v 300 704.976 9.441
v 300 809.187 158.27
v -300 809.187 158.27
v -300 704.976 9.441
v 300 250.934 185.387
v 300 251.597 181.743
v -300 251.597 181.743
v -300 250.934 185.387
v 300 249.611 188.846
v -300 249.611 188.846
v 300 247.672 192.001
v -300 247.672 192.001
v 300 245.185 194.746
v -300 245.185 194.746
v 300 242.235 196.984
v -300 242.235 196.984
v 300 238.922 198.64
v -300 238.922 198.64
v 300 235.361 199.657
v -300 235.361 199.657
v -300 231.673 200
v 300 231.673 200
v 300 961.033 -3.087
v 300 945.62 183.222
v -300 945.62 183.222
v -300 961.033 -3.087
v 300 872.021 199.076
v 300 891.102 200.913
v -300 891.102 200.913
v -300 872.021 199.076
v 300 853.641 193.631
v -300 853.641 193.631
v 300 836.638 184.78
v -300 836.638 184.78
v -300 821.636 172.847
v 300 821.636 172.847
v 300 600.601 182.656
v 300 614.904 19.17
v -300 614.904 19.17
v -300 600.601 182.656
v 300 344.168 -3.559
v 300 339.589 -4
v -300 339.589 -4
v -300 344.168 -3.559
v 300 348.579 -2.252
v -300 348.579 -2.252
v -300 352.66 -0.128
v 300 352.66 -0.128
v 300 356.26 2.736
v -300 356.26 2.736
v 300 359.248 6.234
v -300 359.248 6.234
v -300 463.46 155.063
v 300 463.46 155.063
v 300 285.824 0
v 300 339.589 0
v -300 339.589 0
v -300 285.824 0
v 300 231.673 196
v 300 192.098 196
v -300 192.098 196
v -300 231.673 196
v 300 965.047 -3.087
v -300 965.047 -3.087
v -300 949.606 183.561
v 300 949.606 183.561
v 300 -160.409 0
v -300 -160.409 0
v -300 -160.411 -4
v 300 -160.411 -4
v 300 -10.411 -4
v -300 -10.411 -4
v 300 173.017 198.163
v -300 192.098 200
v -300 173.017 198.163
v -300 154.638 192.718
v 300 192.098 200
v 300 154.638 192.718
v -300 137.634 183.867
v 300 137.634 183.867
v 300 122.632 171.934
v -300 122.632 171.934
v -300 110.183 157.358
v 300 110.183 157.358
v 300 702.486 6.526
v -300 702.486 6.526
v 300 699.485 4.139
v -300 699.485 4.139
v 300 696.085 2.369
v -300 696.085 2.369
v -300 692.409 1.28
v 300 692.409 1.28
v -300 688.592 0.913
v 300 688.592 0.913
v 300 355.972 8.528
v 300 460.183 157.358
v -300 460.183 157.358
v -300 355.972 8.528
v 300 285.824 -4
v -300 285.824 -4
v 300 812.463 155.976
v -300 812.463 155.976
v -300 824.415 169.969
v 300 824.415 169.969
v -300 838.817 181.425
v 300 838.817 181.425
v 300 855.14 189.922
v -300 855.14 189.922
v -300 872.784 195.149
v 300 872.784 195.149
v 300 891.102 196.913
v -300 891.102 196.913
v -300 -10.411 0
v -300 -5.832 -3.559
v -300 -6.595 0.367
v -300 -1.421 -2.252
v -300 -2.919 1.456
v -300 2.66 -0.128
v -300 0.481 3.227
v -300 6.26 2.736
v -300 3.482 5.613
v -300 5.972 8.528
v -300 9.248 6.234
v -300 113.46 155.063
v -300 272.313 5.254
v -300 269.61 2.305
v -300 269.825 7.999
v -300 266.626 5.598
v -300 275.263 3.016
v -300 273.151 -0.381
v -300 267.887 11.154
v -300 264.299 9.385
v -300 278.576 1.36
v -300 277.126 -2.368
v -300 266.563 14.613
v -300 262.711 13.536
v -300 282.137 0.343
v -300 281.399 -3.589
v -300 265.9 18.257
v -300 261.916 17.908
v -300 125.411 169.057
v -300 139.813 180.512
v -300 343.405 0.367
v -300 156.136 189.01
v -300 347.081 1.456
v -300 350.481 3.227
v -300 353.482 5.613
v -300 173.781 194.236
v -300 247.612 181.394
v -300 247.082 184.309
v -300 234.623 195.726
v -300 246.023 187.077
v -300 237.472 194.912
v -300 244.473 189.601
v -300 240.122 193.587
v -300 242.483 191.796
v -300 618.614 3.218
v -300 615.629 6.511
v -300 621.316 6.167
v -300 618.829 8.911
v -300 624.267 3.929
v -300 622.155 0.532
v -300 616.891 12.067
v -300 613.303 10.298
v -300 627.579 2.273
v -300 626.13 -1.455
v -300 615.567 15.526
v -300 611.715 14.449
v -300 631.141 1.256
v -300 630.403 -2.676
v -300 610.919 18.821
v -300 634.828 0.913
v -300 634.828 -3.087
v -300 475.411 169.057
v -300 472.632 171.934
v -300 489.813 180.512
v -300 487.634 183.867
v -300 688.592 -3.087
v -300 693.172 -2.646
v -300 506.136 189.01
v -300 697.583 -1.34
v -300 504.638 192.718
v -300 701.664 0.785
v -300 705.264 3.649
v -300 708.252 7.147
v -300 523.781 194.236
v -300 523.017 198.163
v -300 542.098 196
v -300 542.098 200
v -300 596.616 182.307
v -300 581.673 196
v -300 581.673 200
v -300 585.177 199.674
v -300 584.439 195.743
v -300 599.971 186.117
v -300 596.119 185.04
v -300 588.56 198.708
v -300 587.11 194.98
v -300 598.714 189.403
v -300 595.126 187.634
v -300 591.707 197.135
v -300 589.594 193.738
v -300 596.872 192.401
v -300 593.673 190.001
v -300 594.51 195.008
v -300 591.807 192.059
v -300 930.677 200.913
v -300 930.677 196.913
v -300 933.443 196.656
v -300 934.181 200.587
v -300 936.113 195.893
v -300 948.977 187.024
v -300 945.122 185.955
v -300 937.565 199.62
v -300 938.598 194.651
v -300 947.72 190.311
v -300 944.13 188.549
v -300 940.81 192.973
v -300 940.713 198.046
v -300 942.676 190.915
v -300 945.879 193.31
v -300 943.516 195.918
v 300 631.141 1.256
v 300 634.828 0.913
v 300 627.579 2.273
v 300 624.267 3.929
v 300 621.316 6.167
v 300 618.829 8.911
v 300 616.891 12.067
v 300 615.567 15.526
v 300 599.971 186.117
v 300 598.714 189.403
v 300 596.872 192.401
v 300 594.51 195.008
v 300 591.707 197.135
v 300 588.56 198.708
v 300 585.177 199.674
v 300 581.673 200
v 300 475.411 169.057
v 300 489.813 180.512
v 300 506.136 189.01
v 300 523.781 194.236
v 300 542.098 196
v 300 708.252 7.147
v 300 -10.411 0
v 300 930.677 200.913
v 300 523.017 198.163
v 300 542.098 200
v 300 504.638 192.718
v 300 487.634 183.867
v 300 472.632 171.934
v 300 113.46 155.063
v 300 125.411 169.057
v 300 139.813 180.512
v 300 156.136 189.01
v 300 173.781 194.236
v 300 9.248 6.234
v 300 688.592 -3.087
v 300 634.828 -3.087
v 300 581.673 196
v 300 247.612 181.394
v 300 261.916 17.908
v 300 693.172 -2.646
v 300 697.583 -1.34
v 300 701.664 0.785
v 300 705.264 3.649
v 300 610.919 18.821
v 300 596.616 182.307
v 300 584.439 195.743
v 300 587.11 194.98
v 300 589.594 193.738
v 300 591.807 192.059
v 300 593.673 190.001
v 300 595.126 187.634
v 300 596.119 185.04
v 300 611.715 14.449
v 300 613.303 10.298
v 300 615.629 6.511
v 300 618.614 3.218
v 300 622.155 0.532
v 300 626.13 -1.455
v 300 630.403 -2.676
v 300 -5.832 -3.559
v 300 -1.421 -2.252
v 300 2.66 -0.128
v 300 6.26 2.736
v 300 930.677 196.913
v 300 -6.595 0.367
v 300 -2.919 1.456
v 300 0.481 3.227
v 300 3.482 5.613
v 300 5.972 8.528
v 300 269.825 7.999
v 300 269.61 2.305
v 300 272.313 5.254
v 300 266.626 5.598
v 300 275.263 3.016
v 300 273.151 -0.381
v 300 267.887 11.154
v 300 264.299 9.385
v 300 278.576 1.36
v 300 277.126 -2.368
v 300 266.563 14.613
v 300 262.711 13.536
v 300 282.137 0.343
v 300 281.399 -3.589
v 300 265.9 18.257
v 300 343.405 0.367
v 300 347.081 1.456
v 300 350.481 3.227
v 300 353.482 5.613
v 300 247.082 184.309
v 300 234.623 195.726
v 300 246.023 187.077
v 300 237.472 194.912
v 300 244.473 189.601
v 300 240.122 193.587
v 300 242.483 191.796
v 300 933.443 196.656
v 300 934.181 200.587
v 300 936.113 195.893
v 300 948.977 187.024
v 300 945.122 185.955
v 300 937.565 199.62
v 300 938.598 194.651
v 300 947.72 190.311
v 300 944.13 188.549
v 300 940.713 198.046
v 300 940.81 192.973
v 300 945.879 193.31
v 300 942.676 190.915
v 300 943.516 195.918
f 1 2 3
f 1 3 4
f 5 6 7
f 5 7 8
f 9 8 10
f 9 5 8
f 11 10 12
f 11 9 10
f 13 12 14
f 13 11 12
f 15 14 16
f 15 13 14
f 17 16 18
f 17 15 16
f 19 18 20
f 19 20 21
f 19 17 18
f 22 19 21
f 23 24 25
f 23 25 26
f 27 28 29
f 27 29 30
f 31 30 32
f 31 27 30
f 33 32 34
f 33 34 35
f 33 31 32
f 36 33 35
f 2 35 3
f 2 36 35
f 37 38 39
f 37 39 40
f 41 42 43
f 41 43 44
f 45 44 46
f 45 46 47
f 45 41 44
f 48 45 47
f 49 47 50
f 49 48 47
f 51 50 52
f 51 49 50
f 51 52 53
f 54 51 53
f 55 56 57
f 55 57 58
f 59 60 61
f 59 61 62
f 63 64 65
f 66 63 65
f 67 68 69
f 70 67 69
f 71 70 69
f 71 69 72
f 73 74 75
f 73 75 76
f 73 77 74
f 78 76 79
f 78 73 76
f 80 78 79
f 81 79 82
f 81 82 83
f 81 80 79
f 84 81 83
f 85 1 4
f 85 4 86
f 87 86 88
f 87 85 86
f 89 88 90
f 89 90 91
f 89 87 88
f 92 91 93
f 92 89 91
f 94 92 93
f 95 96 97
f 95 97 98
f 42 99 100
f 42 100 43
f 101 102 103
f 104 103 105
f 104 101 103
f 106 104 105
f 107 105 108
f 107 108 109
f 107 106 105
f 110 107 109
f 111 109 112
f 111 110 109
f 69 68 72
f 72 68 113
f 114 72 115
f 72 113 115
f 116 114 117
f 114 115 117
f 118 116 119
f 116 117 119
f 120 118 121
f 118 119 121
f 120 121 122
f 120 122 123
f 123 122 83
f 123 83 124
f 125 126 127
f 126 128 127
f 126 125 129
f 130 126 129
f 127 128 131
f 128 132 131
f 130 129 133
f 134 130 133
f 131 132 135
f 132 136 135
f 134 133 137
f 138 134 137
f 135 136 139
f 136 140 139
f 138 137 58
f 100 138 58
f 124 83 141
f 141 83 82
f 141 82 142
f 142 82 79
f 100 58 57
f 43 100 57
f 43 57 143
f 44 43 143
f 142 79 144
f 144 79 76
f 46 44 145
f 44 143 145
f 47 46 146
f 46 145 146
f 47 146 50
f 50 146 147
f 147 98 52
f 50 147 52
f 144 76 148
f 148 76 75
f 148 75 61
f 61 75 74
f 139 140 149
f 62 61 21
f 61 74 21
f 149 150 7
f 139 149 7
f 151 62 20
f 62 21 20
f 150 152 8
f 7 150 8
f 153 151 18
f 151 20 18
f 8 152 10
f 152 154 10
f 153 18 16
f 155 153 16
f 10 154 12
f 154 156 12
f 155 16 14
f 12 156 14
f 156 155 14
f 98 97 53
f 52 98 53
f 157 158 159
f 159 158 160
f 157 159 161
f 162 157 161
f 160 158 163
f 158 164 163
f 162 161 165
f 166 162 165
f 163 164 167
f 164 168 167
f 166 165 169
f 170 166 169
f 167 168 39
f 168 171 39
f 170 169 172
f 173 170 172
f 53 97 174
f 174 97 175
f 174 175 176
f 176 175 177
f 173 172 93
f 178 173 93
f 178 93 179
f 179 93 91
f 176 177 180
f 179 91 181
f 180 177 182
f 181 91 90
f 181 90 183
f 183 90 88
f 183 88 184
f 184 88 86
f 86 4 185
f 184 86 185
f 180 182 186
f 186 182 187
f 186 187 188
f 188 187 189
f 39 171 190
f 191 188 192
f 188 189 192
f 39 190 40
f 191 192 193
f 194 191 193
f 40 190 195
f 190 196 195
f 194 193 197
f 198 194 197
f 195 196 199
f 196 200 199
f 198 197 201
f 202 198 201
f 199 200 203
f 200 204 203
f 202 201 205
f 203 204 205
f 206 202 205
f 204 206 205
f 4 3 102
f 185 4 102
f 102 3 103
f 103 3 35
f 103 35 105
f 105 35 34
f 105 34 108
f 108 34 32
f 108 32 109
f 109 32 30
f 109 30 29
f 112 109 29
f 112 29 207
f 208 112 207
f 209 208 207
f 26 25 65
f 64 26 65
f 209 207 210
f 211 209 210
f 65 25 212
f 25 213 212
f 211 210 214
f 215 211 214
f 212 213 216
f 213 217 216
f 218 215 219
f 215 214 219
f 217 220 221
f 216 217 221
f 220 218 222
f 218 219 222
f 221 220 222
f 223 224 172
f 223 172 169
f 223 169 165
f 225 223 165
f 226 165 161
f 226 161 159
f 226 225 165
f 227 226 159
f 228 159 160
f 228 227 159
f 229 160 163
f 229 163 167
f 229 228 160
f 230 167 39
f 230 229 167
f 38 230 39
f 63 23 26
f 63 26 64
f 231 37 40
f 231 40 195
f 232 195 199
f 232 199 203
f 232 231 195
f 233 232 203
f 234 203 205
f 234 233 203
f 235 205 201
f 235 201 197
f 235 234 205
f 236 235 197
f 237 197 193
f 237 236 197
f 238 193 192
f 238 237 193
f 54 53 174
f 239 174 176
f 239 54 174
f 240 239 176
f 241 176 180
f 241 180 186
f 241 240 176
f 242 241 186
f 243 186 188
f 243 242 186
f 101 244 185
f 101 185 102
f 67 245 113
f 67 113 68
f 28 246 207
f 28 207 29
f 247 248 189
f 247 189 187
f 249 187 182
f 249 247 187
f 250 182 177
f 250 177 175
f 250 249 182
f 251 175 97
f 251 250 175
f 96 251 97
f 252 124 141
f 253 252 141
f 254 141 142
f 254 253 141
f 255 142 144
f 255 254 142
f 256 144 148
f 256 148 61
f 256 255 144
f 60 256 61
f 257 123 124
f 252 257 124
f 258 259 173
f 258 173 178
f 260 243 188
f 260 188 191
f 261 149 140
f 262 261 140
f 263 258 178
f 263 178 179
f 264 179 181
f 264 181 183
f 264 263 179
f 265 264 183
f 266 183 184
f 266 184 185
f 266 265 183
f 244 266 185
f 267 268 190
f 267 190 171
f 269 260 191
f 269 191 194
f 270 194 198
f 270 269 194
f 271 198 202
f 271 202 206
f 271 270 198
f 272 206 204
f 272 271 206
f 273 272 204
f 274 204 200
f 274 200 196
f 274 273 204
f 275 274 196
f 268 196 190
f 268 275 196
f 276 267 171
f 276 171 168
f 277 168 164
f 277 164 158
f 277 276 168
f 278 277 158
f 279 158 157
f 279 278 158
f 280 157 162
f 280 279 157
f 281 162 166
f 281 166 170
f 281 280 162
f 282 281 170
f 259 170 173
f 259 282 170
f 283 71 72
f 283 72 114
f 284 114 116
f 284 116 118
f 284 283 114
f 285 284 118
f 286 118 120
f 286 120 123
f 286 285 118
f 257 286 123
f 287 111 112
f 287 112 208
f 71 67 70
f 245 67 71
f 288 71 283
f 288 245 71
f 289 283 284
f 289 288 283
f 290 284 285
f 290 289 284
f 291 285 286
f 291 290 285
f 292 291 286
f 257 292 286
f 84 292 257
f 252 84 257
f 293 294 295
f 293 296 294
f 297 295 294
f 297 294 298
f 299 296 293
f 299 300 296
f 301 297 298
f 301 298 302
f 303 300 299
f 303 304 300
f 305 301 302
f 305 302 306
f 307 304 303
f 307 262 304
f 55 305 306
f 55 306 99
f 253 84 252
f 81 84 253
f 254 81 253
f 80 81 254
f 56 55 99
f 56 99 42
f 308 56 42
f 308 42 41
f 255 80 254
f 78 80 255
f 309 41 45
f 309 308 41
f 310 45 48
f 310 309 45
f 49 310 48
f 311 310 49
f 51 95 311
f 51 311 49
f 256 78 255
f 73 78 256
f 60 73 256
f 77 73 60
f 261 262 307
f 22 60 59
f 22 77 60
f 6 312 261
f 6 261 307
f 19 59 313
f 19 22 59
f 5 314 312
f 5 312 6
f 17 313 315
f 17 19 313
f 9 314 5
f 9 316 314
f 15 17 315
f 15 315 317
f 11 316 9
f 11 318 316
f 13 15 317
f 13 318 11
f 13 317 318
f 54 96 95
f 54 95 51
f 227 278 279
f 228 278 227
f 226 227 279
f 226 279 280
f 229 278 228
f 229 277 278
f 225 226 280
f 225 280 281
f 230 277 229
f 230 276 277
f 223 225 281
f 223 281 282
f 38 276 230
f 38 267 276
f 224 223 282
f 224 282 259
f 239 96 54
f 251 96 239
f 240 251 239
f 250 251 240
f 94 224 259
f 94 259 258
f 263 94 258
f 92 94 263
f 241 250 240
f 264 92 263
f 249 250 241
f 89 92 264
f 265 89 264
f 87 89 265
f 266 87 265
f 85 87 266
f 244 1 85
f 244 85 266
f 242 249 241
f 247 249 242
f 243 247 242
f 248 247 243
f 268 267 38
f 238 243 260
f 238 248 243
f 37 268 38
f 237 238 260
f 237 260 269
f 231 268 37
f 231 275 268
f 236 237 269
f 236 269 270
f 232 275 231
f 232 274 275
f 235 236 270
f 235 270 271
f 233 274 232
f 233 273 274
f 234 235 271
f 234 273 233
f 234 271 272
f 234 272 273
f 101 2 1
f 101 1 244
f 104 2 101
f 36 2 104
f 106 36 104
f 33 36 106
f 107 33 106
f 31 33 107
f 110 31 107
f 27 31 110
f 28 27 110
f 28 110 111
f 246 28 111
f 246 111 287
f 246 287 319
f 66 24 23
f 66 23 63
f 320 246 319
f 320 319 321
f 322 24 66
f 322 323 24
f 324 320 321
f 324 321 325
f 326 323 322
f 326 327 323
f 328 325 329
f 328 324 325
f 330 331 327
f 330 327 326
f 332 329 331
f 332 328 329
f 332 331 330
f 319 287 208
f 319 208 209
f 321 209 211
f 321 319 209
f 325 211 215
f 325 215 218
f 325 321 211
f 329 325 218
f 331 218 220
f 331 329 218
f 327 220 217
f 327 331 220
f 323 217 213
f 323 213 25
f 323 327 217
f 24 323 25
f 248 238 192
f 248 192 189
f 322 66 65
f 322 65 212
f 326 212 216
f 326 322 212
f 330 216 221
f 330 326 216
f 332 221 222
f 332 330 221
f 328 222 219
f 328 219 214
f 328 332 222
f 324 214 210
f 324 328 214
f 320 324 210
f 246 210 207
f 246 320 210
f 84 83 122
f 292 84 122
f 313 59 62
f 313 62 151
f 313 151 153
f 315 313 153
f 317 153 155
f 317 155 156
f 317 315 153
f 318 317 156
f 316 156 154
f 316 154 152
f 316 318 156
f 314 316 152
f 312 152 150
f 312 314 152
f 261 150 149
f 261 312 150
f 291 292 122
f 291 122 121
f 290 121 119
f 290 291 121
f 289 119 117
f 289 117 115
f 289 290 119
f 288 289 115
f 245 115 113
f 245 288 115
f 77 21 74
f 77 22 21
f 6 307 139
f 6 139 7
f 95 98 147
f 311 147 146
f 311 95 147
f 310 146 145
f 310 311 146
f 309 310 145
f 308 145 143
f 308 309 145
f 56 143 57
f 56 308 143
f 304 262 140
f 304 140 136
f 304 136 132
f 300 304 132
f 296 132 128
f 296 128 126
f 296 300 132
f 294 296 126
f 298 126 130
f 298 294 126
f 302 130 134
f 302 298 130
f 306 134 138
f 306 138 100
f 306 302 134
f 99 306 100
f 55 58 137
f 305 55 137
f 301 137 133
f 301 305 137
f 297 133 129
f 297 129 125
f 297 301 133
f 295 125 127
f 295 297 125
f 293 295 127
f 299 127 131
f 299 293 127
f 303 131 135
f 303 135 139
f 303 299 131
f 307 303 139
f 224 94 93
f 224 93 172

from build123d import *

# Parameters (mm, degrees)
F1_DEPTH      = 300
F1_DEPTH_BACK = 300


with BuildPart() as f1:
    # F0 (on Right) → F1 (new body, two sides)
    with BuildSketch(Plane.YZ) as f1_sk:
        with BuildLine():
            Line((110.183008, 157.357644), (5.9717, 8.528471))
            ThreePointArc((5.9717, 8.528471), (-1.176369, 2.259783), (-10.411341, 0))
            Line((-10.411341, 0), (-160.408616, 0))
            Line((-160.408616, 0), (-160.411341, -4))
            Line((-160.411341, -4), (-10.411341, -4))
            ThreePointArc((-10.411341, -4), (0.670626, -1.28826), (9.248308, 6.234166))
            Line((9.248308, 6.234166), (113.459616, 155.063338))
            ThreePointArc((113.459616, 155.063338), (147.770346, 185.15304), (192.098213, 196))
            Line((192.098213, 196), (231.673377, 196))
            ThreePointArc((231.673377, 196), (242.48282, 191.796437), (247.612492, 181.394492))
            Line((247.612492, 181.394492), (261.915687, 17.908216))
            ThreePointArc((261.915687, 17.908216), (269.610202, 2.305292), (285.824377, -4.000046))
            Line((285.824377, -4.000046), (339.588671, -4.000007))
            ThreePointArc((339.588671, -4.000007), (350.670628, -1.288263), (359.248303, 6.234158))
            Line((359.248303, 6.234158), (463.459616, 155.063338))
            ThreePointArc((463.459616, 155.063338), (497.770346, 185.15304), (542.098213, 196))
            Line((542.098213, 196), (581.673377, 196))
            ThreePointArc((581.673377, 196), (591.80723, 192.05916), (596.616297, 182.307336))
            Line((596.616297, 182.307336), (610.919489, 18.821106))
            ThreePointArc((610.919489, 18.821106), (618.613997, 3.218188), (634.828161, -3.087156))
            Line((634.828161, -3.087156), (688.592464, -3.087156))
            ThreePointArc((688.592464, -3.087156), (699.674431, -0.375416), (708.252113, 7.14701))
            Line((708.252113, 7.14701), (812.463422, 155.976182))
            ThreePointArc((812.463422, 155.976182), (846.774151, 186.065884), (891.102018, 196.912844))
            Line((891.102018, 196.912844), (930.677182, 196.912844))
            ThreePointArc((930.677182, 196.912844), (940.810305, 192.972673), (945.61993, 183.222154))
            Line((945.61993, 183.222154), (961.032927, -3.087156))
            Line((961.032927, -3.087156), (965.046592, -3.087156))
            Line((965.046592, -3.087156), (949.605558, 183.561051))
            ThreePointArc((949.605558, 183.561051), (943.516264, 195.918485), (930.677182, 200.912844))
            Line((930.677182, 200.912844), (891.102018, 200.912844))
            ThreePointArc((891.102018, 200.912844), (844.927157, 189.613928), (809.186814, 158.270488))
            Line((809.186814, 158.270488), (704.975505, 9.441316))
            ThreePointArc((704.975505, 9.441316), (697.827437, 3.172628), (688.592464, 0.912844))
            Line((688.592464, 0.912844), (634.828161, 0.912844))
            ThreePointArc((634.828161, 0.912844), (621.316357, 6.167298), (614.904268, 19.169729))
            Line((614.904268, 19.169729), (600.601076, 182.655959))
            ThreePointArc((600.601076, 182.655959), (594.50959, 195.008269), (581.673377, 200))
            Line((581.673377, 200), (542.098213, 200))
            ThreePointArc((542.098213, 200), (495.923351, 188.701083), (460.183008, 157.357644))
            Line((460.183008, 157.357644), (355.971695, 8.528464))
            ThreePointArc((355.971695, 8.528464), (348.823632, 2.259779), (339.588668, -7e-06))
            Line((339.588668, -7e-06), (285.824374, -4.6e-05))
            ThreePointArc((285.824374, -4.6e-05), (272.312561, 5.254403), (265.900466, 18.256839))
            Line((265.900466, 18.256839), (251.59727, 181.743115))
            ThreePointArc((251.59727, 181.743115), (245.185181, 194.745547), (231.673377, 200))
            Line((231.673377, 200), (192.098213, 200))
            ThreePointArc((192.098213, 200), (145.923351, 188.701083), (110.183008, 157.357644))
        make_face()
    extrude(amount=F1_DEPTH)
    extrude(f1_sk.sketch, amount=-F1_DEPTH_BACK)


solid = f1.part
